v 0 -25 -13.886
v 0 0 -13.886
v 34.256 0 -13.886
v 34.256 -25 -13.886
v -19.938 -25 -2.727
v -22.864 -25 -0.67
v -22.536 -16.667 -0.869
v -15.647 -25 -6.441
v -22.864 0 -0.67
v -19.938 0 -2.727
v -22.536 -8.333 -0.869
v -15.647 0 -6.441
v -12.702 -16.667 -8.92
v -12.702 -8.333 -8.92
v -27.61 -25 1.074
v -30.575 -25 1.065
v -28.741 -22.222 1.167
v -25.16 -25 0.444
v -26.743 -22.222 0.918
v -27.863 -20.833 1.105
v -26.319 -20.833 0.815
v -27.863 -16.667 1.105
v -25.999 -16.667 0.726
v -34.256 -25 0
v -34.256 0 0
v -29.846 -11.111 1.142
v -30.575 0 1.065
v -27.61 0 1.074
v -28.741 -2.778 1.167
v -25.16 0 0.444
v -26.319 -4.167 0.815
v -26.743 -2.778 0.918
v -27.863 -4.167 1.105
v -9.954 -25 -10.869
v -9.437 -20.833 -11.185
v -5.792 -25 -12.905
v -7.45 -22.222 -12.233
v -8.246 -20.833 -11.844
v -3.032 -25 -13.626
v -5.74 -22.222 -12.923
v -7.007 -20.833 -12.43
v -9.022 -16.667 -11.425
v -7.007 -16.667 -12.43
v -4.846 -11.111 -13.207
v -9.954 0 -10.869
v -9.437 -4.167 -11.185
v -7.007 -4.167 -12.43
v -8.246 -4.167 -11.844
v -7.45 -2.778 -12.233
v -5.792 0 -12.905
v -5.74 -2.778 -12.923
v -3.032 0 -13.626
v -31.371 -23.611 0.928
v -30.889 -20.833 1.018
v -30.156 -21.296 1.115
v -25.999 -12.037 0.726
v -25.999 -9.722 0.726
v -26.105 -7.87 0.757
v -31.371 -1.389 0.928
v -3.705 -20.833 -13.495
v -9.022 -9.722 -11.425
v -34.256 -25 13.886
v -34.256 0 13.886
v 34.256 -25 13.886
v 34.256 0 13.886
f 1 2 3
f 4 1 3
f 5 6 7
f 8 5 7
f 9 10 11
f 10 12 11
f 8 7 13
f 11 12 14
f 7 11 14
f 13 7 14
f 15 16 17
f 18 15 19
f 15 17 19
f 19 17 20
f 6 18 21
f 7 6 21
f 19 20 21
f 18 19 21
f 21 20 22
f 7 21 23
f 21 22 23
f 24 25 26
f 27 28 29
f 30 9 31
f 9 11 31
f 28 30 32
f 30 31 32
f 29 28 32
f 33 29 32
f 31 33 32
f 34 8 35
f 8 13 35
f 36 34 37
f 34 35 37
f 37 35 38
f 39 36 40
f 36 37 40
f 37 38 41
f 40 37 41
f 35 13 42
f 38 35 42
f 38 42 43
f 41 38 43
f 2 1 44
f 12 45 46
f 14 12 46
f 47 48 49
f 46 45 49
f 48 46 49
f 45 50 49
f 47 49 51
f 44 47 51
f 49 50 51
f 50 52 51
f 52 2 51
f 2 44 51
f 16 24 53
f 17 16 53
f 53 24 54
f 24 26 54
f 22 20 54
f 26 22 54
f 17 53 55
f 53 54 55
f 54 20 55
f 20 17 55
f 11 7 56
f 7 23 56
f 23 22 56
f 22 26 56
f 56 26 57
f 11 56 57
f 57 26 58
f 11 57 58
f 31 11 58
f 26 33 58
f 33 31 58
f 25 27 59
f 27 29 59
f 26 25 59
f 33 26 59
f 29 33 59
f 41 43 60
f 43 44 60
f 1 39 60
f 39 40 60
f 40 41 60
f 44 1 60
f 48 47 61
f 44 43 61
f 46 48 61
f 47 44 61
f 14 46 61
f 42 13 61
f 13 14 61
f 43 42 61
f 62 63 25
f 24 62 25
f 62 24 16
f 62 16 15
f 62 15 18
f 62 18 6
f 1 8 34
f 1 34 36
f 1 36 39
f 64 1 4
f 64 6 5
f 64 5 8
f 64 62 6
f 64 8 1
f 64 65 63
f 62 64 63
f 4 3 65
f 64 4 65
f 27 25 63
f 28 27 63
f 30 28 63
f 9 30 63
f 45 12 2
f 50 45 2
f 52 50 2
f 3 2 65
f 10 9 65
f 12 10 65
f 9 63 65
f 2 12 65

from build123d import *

# Parameters (mm, degrees)
F1_DEPTH = 25


with BuildPart() as f1:
    # F0 (on Front) → F1 (new body)
    with BuildSketch(Plane.XZ):
        with BuildLine():
            Line((0, -13.88579), (34.255888, -13.88579))
            Line((34.255888, -13.88579), (34.255888, 13.88579))
            Line((34.255888, 13.88579), (-34.255888, 13.88579))
            Line((-34.255888, 13.88579), (-34.255888, 0))
            add(Edge.make_bspline(
                [(-34.255888, 0), (-20.009076, 6.145644), (-15.721414, -13.88579), (0, -13.88579)],
                knots=[0, 0, 0, 0, 36.963239, 36.963239, 36.963239, 36.963239], degree=3))
        make_face()
    extrude(amount=F1_DEPTH)


solid = f1.part
